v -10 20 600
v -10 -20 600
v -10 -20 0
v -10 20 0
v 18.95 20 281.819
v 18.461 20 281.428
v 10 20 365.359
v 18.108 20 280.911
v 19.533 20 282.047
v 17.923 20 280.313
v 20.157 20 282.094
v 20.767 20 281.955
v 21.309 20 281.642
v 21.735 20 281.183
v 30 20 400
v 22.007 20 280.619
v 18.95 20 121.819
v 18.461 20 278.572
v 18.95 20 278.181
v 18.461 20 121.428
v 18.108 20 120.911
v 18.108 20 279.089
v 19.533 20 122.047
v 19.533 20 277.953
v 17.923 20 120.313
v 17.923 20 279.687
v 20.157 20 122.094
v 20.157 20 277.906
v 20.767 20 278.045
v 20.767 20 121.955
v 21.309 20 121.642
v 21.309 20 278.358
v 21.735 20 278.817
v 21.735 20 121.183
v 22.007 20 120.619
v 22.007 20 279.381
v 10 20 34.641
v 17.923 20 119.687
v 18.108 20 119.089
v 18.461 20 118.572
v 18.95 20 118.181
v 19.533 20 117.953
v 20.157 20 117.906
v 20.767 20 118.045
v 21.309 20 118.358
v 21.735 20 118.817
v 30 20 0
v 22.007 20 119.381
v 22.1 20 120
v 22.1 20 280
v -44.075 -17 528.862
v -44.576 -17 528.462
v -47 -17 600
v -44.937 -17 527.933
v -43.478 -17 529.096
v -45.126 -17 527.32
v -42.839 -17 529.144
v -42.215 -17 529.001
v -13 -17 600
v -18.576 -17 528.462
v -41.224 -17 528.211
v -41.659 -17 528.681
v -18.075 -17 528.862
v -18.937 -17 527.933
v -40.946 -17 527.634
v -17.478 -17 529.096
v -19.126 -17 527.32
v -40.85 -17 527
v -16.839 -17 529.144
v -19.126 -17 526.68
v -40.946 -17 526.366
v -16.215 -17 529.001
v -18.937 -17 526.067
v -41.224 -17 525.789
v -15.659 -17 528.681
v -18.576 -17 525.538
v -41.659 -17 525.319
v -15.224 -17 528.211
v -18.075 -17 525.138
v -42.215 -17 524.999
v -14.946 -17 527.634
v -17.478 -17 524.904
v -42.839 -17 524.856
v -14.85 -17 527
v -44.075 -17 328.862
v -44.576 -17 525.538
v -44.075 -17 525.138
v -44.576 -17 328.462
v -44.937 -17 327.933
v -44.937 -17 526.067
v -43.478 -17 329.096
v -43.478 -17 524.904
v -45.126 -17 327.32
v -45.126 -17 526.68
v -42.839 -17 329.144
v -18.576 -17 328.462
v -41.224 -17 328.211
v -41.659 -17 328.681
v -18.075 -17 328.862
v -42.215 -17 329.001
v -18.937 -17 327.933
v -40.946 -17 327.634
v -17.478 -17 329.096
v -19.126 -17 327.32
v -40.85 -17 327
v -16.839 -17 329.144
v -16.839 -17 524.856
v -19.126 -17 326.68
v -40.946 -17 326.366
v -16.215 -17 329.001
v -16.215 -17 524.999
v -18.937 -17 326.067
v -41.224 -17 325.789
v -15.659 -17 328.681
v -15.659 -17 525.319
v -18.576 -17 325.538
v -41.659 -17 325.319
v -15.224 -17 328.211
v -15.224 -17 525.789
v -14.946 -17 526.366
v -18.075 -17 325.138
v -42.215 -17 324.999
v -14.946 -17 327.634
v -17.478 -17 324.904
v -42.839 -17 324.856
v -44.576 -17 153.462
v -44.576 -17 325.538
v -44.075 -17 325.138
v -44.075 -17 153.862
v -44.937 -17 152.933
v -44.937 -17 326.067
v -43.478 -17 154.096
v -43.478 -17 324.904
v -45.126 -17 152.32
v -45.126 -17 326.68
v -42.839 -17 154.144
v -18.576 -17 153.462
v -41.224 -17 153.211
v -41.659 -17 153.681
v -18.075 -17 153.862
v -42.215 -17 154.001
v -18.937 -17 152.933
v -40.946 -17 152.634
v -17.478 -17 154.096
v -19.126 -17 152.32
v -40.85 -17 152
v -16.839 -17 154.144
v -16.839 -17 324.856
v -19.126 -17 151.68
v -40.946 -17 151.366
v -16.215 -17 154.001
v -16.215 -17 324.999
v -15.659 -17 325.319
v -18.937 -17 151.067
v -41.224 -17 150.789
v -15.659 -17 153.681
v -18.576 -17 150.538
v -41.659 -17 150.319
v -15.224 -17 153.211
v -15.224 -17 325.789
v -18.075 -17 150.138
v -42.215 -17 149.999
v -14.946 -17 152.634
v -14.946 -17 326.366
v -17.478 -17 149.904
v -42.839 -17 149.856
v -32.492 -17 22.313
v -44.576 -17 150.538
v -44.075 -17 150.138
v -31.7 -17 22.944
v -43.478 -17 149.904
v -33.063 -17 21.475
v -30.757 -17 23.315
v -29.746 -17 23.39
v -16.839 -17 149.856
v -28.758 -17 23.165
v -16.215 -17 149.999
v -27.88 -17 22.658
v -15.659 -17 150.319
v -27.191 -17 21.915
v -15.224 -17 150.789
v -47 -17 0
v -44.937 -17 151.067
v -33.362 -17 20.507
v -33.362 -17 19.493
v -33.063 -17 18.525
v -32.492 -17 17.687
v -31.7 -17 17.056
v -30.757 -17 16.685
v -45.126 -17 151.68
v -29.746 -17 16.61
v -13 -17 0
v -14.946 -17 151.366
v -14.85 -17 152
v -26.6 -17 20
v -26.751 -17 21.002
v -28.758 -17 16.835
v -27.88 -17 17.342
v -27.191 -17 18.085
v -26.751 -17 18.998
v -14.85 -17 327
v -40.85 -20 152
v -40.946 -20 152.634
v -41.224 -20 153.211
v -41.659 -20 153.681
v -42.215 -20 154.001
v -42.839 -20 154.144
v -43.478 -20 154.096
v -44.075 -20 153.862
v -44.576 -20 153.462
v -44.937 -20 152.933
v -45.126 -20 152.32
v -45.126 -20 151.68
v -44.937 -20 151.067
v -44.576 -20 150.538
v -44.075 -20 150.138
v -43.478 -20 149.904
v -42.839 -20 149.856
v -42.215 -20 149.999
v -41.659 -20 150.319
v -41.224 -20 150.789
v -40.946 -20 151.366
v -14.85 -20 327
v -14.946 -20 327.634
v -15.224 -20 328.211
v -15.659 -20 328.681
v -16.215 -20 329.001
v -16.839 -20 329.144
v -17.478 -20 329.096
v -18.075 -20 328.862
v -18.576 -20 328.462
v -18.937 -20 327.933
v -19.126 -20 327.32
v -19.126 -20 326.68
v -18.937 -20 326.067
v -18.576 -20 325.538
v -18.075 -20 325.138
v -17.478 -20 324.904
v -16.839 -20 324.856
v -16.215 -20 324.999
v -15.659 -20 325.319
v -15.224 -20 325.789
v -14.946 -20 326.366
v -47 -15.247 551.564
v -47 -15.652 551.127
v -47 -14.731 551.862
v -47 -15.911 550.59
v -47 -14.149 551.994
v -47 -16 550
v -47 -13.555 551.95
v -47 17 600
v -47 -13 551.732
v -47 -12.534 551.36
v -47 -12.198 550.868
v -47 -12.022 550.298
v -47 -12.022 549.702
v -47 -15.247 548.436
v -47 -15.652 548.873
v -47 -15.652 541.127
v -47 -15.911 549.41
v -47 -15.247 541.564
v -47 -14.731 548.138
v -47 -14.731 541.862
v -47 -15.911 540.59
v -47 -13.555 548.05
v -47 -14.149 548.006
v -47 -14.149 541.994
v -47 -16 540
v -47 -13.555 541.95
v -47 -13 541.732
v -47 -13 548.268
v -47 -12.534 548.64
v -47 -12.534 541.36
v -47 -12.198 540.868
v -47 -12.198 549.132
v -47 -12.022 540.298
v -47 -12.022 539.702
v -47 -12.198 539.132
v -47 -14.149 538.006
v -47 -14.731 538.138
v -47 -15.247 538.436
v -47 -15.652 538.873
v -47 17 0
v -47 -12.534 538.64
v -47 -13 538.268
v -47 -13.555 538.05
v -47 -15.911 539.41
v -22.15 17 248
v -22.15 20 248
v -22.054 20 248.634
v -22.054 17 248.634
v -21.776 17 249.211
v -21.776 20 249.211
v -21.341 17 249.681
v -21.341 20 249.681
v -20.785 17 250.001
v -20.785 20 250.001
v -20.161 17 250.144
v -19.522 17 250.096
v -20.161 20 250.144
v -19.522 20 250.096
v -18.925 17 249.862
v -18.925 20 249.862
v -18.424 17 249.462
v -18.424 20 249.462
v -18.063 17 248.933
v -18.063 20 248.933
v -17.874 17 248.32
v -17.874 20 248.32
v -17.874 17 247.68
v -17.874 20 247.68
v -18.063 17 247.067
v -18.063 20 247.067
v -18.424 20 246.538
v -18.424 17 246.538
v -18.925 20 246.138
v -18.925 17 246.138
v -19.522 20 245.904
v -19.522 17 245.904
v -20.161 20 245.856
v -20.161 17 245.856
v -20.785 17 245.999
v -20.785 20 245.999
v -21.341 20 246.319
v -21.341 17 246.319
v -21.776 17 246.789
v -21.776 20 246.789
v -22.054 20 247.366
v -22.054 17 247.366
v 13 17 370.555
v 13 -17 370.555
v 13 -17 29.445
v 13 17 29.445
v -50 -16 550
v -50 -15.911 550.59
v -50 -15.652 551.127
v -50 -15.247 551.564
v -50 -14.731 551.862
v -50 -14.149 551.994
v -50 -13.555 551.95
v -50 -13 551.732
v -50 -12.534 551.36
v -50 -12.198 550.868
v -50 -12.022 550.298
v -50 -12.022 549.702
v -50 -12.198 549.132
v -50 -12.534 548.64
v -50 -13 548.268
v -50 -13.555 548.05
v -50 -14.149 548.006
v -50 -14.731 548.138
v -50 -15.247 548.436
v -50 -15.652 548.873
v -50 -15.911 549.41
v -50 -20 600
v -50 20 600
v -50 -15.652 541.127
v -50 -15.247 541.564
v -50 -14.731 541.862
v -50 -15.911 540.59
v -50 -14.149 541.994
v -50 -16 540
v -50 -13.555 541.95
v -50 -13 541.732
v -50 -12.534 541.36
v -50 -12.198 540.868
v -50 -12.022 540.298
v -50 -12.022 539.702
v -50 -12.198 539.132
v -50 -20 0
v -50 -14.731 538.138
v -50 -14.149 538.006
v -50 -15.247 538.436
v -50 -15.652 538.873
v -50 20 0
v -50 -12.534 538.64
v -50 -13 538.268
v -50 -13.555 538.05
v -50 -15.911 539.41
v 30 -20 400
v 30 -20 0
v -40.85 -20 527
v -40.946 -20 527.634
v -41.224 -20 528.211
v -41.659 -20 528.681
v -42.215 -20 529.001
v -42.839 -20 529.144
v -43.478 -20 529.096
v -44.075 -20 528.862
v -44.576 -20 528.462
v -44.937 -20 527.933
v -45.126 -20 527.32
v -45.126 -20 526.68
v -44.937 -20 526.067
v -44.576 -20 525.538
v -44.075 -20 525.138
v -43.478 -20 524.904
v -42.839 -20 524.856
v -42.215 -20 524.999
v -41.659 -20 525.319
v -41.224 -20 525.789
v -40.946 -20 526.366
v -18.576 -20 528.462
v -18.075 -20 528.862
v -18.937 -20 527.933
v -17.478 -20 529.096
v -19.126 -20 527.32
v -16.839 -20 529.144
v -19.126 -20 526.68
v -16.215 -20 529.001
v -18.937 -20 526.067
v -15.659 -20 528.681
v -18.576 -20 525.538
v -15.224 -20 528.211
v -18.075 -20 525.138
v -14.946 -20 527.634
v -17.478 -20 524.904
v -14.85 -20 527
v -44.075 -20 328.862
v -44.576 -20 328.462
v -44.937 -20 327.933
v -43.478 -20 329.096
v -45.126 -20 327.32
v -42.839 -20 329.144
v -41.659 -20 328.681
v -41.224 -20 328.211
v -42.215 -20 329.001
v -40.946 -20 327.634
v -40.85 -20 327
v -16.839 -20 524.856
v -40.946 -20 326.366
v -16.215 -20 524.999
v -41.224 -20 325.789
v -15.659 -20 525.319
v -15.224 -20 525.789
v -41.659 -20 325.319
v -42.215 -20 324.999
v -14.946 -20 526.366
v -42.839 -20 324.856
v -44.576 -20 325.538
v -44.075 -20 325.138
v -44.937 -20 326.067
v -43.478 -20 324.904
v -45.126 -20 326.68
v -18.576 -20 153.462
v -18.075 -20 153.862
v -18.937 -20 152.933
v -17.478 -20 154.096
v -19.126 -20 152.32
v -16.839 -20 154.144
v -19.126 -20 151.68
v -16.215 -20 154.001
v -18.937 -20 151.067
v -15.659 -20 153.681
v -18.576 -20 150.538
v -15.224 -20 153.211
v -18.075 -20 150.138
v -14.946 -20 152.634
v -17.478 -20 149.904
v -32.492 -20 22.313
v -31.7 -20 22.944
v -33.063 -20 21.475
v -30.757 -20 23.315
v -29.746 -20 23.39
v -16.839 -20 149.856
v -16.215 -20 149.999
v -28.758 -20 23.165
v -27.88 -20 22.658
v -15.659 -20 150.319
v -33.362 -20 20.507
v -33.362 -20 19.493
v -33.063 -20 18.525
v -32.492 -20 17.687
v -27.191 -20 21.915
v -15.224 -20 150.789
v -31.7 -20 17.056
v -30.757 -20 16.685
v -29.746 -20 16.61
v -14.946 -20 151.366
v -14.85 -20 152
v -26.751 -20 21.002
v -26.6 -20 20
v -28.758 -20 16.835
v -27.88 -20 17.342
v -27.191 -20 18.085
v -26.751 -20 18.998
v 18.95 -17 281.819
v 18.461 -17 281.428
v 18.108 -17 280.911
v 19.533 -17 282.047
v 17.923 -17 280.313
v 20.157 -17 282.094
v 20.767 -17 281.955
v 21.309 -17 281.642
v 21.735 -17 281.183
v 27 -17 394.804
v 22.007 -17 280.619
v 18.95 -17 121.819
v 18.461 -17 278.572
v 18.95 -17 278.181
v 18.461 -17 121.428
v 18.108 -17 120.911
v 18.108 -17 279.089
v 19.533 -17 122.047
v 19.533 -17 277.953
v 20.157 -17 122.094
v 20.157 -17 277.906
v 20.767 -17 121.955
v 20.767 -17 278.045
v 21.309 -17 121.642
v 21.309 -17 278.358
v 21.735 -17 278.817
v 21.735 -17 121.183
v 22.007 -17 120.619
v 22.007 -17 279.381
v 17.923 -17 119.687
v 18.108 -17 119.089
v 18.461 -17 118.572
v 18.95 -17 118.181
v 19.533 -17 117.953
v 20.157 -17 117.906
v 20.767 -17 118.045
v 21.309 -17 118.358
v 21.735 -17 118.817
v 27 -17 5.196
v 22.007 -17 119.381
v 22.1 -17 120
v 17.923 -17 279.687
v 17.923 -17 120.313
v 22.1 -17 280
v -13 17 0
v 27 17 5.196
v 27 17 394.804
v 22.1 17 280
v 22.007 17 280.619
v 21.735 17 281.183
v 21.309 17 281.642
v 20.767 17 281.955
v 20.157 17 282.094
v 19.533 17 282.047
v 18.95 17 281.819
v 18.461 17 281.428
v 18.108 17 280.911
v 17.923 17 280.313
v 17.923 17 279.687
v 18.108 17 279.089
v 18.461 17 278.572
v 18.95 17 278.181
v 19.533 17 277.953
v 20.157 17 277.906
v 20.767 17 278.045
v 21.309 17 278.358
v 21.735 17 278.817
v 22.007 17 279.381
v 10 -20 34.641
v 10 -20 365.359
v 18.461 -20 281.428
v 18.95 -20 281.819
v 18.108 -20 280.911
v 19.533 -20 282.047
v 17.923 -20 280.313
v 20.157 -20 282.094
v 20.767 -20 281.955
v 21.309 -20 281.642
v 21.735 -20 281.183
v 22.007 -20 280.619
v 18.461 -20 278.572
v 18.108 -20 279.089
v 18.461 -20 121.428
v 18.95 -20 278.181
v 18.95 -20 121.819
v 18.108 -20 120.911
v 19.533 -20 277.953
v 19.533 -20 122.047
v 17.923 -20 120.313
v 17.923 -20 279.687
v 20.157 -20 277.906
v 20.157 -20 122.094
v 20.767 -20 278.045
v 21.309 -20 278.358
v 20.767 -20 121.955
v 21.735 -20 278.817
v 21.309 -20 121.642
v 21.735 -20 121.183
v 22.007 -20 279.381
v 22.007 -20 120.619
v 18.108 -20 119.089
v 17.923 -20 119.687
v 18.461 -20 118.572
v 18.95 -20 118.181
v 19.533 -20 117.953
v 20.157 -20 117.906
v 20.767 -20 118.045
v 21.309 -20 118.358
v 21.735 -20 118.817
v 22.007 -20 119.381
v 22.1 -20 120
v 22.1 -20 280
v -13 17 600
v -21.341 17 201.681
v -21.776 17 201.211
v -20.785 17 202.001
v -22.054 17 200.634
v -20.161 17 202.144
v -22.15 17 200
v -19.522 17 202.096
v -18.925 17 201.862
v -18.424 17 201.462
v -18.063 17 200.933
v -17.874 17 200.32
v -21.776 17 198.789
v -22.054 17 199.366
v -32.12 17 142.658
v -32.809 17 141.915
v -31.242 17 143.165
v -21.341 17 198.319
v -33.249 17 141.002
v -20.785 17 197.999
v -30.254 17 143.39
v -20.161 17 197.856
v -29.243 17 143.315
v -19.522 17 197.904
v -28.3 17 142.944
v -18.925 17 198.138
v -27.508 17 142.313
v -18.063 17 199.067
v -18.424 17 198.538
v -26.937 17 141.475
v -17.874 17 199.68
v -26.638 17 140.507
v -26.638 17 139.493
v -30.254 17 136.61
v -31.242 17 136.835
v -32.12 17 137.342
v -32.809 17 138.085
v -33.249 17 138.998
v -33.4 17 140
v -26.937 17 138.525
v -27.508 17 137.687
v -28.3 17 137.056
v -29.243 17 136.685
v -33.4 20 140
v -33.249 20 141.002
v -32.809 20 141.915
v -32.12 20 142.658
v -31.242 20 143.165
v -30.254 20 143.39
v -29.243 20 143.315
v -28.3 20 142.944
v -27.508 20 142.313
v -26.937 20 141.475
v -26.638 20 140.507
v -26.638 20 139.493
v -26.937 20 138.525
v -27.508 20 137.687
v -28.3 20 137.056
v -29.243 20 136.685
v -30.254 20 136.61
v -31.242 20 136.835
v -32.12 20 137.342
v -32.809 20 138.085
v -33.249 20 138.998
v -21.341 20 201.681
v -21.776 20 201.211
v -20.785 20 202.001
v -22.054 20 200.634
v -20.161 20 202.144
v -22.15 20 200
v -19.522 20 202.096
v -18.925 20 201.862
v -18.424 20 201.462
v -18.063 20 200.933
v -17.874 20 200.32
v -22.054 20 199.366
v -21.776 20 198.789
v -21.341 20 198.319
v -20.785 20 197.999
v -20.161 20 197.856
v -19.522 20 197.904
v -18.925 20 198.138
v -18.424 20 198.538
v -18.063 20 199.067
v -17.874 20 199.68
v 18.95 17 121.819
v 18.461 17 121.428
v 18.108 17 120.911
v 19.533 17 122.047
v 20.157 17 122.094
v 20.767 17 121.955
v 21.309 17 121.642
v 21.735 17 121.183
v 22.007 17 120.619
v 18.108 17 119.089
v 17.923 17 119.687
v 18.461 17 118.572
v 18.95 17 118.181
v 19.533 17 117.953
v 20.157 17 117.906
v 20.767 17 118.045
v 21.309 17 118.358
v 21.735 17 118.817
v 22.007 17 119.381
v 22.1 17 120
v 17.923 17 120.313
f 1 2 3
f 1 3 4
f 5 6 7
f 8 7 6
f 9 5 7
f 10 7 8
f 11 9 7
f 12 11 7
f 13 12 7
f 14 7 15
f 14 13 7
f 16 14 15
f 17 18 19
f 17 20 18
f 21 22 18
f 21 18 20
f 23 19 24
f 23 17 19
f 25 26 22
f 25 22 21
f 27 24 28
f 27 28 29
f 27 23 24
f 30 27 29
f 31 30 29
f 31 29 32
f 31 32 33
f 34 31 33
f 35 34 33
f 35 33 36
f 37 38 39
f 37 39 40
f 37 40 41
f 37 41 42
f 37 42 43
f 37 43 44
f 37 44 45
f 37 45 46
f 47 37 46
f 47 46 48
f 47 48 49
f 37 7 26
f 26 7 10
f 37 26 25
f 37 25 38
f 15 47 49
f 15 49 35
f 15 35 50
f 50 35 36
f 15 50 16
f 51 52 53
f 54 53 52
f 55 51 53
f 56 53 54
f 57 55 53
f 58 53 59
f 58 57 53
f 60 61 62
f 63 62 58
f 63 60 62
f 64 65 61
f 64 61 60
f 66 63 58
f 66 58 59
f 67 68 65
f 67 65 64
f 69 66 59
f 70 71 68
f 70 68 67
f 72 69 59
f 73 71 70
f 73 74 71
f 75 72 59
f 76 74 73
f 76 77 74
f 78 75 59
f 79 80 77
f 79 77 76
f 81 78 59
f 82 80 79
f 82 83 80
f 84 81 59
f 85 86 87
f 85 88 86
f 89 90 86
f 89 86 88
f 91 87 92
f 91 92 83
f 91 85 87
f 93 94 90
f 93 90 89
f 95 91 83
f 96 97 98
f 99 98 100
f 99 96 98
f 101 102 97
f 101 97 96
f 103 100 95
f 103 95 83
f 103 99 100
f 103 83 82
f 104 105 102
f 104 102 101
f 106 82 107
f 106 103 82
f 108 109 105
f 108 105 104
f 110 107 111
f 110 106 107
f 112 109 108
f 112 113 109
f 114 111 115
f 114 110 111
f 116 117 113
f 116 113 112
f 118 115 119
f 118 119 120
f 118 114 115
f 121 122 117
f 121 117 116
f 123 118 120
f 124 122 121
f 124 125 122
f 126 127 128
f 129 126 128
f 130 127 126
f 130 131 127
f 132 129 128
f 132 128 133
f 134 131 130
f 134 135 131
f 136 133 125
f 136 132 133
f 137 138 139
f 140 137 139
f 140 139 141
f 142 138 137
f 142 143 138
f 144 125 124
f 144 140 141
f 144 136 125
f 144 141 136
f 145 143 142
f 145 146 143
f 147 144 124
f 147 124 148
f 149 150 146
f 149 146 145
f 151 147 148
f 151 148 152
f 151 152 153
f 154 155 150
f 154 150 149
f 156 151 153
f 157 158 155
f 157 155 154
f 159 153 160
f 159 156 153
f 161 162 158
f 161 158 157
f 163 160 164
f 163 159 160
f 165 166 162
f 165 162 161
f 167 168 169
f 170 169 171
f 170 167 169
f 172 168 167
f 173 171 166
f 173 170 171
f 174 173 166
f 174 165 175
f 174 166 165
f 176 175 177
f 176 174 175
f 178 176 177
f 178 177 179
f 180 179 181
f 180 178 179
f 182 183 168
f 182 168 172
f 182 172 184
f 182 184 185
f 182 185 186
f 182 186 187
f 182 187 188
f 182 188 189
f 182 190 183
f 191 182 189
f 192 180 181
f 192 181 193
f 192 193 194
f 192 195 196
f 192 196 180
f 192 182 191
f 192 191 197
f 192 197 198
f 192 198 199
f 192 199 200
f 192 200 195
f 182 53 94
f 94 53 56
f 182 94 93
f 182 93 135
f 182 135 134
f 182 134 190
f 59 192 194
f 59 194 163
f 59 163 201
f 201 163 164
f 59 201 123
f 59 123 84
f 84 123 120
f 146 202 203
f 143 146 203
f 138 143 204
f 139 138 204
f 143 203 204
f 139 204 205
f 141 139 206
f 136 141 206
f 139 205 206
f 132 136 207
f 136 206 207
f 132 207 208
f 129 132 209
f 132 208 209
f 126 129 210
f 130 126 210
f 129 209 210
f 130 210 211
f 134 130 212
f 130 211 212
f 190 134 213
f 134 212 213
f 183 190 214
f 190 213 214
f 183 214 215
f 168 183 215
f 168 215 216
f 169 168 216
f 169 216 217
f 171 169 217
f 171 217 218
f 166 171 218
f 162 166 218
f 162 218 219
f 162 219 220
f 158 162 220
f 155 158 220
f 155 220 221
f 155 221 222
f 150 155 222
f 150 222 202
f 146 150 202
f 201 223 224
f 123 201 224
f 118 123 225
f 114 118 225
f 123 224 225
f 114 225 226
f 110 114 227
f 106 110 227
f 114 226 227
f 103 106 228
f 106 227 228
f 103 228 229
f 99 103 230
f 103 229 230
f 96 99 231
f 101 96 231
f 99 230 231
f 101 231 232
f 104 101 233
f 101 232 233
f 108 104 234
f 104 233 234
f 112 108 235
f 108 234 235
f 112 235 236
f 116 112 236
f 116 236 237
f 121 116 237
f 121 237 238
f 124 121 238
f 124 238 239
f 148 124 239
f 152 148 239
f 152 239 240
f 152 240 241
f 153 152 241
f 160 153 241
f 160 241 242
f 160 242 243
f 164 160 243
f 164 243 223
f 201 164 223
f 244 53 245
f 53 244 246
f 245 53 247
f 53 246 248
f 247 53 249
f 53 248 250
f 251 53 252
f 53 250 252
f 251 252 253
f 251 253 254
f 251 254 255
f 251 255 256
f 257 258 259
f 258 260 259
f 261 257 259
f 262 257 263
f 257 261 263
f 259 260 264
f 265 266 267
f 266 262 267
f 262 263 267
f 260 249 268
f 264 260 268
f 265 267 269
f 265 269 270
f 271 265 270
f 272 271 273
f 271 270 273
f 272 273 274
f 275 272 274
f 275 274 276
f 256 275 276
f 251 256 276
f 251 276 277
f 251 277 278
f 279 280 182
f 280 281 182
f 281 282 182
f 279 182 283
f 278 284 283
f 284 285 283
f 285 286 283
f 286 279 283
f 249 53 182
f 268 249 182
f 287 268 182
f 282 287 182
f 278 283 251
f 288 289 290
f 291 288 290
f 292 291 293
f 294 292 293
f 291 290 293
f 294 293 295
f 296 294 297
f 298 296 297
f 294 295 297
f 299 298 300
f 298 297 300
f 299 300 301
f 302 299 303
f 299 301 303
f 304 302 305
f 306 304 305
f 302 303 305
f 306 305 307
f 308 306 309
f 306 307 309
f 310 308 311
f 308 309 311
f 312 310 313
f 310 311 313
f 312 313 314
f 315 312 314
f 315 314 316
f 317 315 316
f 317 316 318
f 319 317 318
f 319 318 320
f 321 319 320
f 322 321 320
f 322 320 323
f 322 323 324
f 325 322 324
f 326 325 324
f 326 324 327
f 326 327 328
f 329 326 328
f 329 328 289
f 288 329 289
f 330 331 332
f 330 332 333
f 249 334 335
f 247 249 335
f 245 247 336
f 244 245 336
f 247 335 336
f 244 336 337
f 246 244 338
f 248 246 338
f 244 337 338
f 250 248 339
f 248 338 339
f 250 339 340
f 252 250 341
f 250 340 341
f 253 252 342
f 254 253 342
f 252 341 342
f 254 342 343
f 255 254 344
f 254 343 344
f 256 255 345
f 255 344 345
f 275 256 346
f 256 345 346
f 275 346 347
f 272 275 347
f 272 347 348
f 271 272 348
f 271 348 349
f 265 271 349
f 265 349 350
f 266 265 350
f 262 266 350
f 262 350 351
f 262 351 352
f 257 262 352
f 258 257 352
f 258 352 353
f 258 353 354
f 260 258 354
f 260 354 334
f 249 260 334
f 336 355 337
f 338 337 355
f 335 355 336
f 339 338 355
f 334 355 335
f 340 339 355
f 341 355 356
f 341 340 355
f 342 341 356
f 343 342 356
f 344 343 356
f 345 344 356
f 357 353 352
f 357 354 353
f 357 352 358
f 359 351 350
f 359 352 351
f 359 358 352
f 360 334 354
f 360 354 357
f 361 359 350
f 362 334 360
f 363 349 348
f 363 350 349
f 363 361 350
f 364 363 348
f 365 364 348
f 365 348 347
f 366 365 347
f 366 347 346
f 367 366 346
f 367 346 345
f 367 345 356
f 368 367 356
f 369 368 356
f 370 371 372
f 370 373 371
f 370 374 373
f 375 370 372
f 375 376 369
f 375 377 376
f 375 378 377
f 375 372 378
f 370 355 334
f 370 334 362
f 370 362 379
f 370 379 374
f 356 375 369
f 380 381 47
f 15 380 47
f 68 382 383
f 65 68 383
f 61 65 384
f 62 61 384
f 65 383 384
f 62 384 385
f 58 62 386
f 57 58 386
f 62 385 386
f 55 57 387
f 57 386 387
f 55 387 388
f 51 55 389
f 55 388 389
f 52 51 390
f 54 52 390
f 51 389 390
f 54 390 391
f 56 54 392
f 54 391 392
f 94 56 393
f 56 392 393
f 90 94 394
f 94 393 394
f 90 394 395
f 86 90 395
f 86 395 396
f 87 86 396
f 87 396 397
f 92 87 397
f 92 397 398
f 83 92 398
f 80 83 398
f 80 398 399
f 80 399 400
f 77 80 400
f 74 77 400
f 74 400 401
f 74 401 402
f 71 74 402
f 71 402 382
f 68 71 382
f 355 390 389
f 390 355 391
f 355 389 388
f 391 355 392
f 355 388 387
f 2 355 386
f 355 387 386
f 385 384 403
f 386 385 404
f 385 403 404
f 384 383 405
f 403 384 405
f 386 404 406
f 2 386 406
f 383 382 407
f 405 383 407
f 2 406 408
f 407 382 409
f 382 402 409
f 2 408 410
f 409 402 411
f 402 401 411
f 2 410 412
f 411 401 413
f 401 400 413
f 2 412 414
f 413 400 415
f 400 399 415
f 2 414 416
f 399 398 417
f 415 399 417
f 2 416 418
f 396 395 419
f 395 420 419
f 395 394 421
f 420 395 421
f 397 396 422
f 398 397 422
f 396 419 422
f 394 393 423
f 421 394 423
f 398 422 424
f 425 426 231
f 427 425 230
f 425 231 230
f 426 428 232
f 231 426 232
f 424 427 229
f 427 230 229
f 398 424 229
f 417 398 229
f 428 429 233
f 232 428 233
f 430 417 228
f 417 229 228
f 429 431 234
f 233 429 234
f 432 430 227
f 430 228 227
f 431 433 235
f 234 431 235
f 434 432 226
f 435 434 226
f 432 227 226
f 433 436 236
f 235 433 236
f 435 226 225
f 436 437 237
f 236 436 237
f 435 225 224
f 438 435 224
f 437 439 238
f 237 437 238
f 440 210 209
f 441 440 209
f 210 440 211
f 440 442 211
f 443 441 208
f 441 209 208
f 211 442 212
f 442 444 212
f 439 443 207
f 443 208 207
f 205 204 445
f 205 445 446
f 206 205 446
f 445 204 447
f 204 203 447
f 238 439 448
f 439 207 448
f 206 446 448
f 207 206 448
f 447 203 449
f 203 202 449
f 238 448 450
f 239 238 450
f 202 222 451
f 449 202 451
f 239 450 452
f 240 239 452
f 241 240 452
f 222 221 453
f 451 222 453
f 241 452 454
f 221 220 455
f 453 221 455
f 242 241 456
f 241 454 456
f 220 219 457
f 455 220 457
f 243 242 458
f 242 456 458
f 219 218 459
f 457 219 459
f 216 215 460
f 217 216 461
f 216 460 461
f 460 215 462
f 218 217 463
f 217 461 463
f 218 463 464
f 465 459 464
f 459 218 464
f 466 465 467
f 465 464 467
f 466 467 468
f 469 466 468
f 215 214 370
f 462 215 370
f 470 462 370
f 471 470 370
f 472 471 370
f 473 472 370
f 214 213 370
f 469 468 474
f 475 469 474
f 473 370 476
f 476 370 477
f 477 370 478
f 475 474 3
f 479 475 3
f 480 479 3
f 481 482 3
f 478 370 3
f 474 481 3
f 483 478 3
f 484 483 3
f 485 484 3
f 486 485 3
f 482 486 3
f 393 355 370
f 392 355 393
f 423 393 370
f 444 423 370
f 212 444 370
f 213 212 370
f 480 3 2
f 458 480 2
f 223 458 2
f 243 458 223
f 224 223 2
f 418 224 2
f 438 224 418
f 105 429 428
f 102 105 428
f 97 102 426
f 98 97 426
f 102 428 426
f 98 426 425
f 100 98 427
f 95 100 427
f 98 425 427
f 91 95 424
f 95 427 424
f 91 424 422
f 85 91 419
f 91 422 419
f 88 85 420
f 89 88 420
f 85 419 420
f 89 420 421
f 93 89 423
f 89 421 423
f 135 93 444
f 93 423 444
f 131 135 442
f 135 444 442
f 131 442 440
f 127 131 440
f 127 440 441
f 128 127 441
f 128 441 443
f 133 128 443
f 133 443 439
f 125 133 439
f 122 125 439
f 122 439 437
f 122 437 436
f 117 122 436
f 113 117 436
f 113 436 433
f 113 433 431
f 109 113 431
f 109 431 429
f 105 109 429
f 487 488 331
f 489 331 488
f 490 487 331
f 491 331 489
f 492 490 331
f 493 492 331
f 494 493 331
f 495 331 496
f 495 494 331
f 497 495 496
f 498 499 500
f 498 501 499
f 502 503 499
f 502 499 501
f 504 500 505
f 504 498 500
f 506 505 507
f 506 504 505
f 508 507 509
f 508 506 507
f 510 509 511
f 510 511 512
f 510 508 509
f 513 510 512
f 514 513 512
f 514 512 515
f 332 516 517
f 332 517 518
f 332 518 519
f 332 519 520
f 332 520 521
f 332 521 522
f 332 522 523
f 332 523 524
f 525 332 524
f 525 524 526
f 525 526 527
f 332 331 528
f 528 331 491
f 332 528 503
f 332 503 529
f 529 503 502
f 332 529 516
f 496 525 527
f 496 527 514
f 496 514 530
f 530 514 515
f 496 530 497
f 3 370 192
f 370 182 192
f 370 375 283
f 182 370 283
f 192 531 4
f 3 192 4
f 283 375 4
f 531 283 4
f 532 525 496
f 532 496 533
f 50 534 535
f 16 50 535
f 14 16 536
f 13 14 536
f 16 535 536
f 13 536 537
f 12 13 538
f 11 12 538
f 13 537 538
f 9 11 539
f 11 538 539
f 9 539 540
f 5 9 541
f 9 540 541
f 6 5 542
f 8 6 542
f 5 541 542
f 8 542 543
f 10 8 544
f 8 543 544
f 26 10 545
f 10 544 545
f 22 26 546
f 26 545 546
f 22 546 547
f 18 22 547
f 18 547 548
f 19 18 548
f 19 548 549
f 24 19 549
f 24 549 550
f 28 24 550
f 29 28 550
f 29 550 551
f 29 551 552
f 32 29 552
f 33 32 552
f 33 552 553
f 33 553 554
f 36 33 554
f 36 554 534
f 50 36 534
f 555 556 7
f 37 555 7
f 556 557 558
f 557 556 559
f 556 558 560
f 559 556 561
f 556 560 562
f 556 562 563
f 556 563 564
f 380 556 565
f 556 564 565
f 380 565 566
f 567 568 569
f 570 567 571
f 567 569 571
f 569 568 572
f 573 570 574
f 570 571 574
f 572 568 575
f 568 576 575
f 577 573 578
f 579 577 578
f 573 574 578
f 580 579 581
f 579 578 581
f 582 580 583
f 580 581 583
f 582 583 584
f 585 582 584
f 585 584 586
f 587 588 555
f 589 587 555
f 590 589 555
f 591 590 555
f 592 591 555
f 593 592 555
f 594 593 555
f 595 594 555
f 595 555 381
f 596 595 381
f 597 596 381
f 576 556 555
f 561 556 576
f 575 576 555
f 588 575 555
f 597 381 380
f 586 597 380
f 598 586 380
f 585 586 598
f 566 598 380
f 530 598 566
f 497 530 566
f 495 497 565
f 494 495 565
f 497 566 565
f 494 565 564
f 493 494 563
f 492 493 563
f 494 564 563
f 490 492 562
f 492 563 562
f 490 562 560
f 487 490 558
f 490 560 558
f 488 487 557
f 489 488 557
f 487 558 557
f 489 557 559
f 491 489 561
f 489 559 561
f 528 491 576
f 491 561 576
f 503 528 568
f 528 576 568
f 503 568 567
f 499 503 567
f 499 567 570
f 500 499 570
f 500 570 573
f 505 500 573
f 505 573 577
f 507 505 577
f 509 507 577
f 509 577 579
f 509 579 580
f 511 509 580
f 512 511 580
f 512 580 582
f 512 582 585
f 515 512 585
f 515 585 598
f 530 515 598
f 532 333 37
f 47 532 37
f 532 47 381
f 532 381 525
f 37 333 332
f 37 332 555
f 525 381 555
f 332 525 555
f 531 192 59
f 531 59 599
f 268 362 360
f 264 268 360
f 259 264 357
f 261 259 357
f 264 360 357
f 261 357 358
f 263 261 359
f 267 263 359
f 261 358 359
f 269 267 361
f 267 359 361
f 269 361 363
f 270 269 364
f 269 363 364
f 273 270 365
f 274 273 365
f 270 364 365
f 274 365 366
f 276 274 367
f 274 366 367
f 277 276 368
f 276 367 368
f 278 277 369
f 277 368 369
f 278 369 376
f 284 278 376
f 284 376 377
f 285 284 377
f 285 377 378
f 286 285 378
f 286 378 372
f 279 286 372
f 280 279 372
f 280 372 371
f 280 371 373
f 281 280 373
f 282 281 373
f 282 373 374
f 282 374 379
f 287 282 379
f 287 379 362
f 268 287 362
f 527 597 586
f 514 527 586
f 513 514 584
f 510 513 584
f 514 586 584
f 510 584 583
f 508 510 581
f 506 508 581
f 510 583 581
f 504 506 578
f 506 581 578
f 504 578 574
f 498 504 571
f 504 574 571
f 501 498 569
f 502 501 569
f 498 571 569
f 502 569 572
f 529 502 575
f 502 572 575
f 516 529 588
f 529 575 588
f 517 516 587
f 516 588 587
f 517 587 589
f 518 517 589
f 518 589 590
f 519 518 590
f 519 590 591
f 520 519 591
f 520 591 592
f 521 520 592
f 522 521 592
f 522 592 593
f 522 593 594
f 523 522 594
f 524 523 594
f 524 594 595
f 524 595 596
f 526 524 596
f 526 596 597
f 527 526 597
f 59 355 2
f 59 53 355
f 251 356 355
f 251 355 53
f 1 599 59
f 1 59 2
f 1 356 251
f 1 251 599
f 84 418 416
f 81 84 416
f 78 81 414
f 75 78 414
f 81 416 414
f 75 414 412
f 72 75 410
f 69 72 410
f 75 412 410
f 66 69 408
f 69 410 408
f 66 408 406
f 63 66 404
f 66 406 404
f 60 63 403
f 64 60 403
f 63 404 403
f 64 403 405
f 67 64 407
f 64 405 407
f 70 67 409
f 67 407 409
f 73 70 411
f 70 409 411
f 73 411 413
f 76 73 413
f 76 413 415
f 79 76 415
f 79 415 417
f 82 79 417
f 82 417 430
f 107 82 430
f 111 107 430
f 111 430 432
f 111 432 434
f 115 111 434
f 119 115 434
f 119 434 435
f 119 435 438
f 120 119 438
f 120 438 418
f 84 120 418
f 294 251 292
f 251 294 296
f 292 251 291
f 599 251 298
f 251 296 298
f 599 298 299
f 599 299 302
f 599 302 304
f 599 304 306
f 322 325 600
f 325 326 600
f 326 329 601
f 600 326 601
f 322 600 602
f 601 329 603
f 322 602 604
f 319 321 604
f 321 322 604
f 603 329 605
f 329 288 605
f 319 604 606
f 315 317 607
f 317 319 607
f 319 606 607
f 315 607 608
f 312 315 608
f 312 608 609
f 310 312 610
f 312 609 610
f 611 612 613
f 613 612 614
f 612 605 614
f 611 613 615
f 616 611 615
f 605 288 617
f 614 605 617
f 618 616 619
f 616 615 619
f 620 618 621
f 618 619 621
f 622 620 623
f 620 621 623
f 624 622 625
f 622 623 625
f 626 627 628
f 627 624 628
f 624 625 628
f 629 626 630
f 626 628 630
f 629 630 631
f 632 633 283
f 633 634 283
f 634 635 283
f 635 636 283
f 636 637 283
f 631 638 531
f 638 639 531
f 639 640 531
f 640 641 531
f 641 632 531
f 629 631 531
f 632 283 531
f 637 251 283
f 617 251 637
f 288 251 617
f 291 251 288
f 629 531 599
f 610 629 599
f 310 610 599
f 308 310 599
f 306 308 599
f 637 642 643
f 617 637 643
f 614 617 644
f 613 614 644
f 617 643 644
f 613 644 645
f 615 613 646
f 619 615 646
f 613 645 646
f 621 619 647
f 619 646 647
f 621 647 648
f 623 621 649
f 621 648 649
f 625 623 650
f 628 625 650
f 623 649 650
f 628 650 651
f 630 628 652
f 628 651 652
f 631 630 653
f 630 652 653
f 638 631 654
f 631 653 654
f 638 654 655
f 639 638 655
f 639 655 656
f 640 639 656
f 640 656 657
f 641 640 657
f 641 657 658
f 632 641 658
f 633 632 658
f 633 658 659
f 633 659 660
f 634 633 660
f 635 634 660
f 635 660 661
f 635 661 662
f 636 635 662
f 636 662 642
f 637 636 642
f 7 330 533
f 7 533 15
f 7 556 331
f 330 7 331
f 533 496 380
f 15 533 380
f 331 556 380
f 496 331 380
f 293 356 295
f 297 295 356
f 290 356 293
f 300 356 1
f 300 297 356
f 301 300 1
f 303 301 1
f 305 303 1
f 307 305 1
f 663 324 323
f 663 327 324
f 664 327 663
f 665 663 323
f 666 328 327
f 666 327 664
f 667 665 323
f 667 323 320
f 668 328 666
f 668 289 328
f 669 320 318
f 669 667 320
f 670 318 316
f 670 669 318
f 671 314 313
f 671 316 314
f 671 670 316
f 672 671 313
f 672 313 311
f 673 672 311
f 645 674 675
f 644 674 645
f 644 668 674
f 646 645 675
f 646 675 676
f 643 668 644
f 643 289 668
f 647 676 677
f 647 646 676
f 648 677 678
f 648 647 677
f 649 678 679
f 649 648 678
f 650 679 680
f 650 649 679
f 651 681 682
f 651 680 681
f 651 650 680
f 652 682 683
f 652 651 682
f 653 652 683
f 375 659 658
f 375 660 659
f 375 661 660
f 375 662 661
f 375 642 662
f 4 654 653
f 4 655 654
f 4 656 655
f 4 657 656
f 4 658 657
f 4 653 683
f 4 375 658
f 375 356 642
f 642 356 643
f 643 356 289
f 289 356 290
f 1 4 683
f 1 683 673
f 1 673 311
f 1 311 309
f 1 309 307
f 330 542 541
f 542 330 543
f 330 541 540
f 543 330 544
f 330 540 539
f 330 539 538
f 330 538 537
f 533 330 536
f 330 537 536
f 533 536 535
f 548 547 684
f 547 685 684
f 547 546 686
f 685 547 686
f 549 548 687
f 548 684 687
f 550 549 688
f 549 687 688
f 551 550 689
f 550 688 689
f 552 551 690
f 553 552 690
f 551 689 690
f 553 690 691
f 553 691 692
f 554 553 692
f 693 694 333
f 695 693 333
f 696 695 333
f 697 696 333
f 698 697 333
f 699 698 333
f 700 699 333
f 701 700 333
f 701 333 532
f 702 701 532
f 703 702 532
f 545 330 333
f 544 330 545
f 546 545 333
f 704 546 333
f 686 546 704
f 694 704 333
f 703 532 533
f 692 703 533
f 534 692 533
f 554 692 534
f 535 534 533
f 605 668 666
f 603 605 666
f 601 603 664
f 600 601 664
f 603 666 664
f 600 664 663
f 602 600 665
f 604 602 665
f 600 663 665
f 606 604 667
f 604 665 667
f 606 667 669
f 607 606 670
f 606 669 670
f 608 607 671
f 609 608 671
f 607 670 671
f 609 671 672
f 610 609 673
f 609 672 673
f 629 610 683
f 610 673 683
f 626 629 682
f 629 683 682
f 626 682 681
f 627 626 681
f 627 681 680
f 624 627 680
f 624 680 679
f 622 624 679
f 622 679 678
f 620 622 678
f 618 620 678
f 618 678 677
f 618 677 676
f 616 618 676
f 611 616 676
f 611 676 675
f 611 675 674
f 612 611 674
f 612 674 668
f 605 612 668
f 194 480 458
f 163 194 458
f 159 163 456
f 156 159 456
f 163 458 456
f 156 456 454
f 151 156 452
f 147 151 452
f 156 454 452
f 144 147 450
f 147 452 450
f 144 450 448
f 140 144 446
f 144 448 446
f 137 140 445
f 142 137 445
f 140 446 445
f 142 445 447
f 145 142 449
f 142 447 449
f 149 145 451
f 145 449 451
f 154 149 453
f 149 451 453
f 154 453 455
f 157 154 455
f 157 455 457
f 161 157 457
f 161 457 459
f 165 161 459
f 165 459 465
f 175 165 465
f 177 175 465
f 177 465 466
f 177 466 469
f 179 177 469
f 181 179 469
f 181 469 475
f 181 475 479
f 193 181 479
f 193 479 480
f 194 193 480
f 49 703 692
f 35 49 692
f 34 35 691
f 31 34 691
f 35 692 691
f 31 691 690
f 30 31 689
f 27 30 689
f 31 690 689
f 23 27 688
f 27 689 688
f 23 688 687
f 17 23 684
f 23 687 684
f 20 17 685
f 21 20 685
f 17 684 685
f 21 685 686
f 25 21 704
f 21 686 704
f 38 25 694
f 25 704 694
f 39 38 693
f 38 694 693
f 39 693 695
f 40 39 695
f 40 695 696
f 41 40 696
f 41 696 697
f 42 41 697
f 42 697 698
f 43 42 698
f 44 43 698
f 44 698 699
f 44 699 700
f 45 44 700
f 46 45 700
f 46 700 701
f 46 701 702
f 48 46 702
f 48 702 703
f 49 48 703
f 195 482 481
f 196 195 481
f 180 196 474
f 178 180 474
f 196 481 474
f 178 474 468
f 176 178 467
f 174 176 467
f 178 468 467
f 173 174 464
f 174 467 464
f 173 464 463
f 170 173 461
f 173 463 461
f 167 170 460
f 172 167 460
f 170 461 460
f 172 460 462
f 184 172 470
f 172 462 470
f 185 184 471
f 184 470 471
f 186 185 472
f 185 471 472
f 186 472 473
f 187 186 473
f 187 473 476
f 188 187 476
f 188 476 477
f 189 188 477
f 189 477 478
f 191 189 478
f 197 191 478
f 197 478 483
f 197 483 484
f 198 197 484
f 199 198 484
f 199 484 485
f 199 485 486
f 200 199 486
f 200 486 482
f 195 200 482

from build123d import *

# Parameters (mm, degrees)
F0_W      = 40
F0_H      = 40
F0_W_2    = 34
F0_H_2    = 34
F1_DEPTH  = 600
F0_W_3    = 20
F0_W_4    = 14
F2_DEPTH  = 400
F4_DEPTH  = 40.001
F5_R      = 2.15
F5_R_2    = 3.4
F6_DEPTH  = 25
F7_R      = 2
F8_DEPTH  = 25
F9_R      = 3.4
F9_R_2    = 2.15
F10_DEPTH = 25
F11_R     = 2.1
F12_DEPTH = 40.001


with BuildPart() as f1:
    # F0 (on Top) → F1 (new body)
    with BuildSketch(Plane.XY):
        with Locations((-30, 0)):
            Rectangle(F0_W, F0_H)
        with Locations((-30, 0)):
            Rectangle(F0_W_2, F0_H_2, mode=Mode.SUBTRACT)
    extrude(amount=F1_DEPTH)

    # F5 (on face) → F6 (cut)
    with BuildSketch(Plane.XZ.offset(20)):
        with Locations((-43, 527)):
            Circle(F5_R)
        with Locations((-17, 527)):
            Circle(F5_R)
        with Locations((-43, 327)):
            Circle(F5_R)
        with Locations((-17, 327)):
            Circle(F5_R)
        with Locations((-43, 152)):
            Circle(F5_R)
        with Locations((-17, 152)):
            Circle(F5_R)
        with Locations((-30, 20)):
            Circle(F5_R_2)
    extrude(amount=-F6_DEPTH, mode=Mode.SUBTRACT)

    # F7 (on face) → F8 (cut)
    with BuildSketch(Plane(origin=(-50, 0, 0), x_dir=(0, -1, 0), z_dir=(-1, 0, 0))):
        with Locations((14, 550)):
            Circle(F7_R)
        with Locations((14, 540)):
            Circle(F7_R)
    extrude(amount=-F8_DEPTH, mode=Mode.SUBTRACT)

    # F9 (on face) → F10 (cut)
    with BuildSketch(Plane(origin=(0, 20, 0), x_dir=(-1, 0, 0), z_dir=(0, 1, 0))):
        with Locations((30, 140)):
            Circle(F9_R)
        with Locations((20, 200)):
            Circle(F9_R_2)
        with Locations((20, 248)):
            Circle(F9_R_2)
    extrude(amount=-F10_DEPTH, mode=Mode.SUBTRACT)


with BuildPart() as f2:
    # F0 (on Top) → F2 (new body)
    with BuildSketch(Plane.XY):
        with Locations((20, 0)):
            Rectangle(F0_W_3, F0_H)
        with Locations((20, 0)):
            Rectangle(F0_W_4, F0_H_2, mode=Mode.SUBTRACT)
    extrude(amount=F2_DEPTH)

    # F3 (on face) → F4 (cut, through all)
    with BuildSketch(Plane.XZ.offset(20)):
        Polygon((10, 365.358984), (30, 400), (10, 400), align=None)
        Polygon((10, 0), (30, 0), (10, 34.641016), align=None)
    extrude(amount=-F4_DEPTH, mode=Mode.SUBTRACT)

    # F11 (on face) → F12 (cut, through all)
    with BuildSketch(Plane.XZ.offset(20)):
        with Locations((20, 280)):
            Circle(F11_R)
        with Locations((20, 120)):
            Circle(F11_R)
    extrude(amount=-F12_DEPTH, mode=Mode.SUBTRACT)


solid = Compound([f1.part, f2.part])
